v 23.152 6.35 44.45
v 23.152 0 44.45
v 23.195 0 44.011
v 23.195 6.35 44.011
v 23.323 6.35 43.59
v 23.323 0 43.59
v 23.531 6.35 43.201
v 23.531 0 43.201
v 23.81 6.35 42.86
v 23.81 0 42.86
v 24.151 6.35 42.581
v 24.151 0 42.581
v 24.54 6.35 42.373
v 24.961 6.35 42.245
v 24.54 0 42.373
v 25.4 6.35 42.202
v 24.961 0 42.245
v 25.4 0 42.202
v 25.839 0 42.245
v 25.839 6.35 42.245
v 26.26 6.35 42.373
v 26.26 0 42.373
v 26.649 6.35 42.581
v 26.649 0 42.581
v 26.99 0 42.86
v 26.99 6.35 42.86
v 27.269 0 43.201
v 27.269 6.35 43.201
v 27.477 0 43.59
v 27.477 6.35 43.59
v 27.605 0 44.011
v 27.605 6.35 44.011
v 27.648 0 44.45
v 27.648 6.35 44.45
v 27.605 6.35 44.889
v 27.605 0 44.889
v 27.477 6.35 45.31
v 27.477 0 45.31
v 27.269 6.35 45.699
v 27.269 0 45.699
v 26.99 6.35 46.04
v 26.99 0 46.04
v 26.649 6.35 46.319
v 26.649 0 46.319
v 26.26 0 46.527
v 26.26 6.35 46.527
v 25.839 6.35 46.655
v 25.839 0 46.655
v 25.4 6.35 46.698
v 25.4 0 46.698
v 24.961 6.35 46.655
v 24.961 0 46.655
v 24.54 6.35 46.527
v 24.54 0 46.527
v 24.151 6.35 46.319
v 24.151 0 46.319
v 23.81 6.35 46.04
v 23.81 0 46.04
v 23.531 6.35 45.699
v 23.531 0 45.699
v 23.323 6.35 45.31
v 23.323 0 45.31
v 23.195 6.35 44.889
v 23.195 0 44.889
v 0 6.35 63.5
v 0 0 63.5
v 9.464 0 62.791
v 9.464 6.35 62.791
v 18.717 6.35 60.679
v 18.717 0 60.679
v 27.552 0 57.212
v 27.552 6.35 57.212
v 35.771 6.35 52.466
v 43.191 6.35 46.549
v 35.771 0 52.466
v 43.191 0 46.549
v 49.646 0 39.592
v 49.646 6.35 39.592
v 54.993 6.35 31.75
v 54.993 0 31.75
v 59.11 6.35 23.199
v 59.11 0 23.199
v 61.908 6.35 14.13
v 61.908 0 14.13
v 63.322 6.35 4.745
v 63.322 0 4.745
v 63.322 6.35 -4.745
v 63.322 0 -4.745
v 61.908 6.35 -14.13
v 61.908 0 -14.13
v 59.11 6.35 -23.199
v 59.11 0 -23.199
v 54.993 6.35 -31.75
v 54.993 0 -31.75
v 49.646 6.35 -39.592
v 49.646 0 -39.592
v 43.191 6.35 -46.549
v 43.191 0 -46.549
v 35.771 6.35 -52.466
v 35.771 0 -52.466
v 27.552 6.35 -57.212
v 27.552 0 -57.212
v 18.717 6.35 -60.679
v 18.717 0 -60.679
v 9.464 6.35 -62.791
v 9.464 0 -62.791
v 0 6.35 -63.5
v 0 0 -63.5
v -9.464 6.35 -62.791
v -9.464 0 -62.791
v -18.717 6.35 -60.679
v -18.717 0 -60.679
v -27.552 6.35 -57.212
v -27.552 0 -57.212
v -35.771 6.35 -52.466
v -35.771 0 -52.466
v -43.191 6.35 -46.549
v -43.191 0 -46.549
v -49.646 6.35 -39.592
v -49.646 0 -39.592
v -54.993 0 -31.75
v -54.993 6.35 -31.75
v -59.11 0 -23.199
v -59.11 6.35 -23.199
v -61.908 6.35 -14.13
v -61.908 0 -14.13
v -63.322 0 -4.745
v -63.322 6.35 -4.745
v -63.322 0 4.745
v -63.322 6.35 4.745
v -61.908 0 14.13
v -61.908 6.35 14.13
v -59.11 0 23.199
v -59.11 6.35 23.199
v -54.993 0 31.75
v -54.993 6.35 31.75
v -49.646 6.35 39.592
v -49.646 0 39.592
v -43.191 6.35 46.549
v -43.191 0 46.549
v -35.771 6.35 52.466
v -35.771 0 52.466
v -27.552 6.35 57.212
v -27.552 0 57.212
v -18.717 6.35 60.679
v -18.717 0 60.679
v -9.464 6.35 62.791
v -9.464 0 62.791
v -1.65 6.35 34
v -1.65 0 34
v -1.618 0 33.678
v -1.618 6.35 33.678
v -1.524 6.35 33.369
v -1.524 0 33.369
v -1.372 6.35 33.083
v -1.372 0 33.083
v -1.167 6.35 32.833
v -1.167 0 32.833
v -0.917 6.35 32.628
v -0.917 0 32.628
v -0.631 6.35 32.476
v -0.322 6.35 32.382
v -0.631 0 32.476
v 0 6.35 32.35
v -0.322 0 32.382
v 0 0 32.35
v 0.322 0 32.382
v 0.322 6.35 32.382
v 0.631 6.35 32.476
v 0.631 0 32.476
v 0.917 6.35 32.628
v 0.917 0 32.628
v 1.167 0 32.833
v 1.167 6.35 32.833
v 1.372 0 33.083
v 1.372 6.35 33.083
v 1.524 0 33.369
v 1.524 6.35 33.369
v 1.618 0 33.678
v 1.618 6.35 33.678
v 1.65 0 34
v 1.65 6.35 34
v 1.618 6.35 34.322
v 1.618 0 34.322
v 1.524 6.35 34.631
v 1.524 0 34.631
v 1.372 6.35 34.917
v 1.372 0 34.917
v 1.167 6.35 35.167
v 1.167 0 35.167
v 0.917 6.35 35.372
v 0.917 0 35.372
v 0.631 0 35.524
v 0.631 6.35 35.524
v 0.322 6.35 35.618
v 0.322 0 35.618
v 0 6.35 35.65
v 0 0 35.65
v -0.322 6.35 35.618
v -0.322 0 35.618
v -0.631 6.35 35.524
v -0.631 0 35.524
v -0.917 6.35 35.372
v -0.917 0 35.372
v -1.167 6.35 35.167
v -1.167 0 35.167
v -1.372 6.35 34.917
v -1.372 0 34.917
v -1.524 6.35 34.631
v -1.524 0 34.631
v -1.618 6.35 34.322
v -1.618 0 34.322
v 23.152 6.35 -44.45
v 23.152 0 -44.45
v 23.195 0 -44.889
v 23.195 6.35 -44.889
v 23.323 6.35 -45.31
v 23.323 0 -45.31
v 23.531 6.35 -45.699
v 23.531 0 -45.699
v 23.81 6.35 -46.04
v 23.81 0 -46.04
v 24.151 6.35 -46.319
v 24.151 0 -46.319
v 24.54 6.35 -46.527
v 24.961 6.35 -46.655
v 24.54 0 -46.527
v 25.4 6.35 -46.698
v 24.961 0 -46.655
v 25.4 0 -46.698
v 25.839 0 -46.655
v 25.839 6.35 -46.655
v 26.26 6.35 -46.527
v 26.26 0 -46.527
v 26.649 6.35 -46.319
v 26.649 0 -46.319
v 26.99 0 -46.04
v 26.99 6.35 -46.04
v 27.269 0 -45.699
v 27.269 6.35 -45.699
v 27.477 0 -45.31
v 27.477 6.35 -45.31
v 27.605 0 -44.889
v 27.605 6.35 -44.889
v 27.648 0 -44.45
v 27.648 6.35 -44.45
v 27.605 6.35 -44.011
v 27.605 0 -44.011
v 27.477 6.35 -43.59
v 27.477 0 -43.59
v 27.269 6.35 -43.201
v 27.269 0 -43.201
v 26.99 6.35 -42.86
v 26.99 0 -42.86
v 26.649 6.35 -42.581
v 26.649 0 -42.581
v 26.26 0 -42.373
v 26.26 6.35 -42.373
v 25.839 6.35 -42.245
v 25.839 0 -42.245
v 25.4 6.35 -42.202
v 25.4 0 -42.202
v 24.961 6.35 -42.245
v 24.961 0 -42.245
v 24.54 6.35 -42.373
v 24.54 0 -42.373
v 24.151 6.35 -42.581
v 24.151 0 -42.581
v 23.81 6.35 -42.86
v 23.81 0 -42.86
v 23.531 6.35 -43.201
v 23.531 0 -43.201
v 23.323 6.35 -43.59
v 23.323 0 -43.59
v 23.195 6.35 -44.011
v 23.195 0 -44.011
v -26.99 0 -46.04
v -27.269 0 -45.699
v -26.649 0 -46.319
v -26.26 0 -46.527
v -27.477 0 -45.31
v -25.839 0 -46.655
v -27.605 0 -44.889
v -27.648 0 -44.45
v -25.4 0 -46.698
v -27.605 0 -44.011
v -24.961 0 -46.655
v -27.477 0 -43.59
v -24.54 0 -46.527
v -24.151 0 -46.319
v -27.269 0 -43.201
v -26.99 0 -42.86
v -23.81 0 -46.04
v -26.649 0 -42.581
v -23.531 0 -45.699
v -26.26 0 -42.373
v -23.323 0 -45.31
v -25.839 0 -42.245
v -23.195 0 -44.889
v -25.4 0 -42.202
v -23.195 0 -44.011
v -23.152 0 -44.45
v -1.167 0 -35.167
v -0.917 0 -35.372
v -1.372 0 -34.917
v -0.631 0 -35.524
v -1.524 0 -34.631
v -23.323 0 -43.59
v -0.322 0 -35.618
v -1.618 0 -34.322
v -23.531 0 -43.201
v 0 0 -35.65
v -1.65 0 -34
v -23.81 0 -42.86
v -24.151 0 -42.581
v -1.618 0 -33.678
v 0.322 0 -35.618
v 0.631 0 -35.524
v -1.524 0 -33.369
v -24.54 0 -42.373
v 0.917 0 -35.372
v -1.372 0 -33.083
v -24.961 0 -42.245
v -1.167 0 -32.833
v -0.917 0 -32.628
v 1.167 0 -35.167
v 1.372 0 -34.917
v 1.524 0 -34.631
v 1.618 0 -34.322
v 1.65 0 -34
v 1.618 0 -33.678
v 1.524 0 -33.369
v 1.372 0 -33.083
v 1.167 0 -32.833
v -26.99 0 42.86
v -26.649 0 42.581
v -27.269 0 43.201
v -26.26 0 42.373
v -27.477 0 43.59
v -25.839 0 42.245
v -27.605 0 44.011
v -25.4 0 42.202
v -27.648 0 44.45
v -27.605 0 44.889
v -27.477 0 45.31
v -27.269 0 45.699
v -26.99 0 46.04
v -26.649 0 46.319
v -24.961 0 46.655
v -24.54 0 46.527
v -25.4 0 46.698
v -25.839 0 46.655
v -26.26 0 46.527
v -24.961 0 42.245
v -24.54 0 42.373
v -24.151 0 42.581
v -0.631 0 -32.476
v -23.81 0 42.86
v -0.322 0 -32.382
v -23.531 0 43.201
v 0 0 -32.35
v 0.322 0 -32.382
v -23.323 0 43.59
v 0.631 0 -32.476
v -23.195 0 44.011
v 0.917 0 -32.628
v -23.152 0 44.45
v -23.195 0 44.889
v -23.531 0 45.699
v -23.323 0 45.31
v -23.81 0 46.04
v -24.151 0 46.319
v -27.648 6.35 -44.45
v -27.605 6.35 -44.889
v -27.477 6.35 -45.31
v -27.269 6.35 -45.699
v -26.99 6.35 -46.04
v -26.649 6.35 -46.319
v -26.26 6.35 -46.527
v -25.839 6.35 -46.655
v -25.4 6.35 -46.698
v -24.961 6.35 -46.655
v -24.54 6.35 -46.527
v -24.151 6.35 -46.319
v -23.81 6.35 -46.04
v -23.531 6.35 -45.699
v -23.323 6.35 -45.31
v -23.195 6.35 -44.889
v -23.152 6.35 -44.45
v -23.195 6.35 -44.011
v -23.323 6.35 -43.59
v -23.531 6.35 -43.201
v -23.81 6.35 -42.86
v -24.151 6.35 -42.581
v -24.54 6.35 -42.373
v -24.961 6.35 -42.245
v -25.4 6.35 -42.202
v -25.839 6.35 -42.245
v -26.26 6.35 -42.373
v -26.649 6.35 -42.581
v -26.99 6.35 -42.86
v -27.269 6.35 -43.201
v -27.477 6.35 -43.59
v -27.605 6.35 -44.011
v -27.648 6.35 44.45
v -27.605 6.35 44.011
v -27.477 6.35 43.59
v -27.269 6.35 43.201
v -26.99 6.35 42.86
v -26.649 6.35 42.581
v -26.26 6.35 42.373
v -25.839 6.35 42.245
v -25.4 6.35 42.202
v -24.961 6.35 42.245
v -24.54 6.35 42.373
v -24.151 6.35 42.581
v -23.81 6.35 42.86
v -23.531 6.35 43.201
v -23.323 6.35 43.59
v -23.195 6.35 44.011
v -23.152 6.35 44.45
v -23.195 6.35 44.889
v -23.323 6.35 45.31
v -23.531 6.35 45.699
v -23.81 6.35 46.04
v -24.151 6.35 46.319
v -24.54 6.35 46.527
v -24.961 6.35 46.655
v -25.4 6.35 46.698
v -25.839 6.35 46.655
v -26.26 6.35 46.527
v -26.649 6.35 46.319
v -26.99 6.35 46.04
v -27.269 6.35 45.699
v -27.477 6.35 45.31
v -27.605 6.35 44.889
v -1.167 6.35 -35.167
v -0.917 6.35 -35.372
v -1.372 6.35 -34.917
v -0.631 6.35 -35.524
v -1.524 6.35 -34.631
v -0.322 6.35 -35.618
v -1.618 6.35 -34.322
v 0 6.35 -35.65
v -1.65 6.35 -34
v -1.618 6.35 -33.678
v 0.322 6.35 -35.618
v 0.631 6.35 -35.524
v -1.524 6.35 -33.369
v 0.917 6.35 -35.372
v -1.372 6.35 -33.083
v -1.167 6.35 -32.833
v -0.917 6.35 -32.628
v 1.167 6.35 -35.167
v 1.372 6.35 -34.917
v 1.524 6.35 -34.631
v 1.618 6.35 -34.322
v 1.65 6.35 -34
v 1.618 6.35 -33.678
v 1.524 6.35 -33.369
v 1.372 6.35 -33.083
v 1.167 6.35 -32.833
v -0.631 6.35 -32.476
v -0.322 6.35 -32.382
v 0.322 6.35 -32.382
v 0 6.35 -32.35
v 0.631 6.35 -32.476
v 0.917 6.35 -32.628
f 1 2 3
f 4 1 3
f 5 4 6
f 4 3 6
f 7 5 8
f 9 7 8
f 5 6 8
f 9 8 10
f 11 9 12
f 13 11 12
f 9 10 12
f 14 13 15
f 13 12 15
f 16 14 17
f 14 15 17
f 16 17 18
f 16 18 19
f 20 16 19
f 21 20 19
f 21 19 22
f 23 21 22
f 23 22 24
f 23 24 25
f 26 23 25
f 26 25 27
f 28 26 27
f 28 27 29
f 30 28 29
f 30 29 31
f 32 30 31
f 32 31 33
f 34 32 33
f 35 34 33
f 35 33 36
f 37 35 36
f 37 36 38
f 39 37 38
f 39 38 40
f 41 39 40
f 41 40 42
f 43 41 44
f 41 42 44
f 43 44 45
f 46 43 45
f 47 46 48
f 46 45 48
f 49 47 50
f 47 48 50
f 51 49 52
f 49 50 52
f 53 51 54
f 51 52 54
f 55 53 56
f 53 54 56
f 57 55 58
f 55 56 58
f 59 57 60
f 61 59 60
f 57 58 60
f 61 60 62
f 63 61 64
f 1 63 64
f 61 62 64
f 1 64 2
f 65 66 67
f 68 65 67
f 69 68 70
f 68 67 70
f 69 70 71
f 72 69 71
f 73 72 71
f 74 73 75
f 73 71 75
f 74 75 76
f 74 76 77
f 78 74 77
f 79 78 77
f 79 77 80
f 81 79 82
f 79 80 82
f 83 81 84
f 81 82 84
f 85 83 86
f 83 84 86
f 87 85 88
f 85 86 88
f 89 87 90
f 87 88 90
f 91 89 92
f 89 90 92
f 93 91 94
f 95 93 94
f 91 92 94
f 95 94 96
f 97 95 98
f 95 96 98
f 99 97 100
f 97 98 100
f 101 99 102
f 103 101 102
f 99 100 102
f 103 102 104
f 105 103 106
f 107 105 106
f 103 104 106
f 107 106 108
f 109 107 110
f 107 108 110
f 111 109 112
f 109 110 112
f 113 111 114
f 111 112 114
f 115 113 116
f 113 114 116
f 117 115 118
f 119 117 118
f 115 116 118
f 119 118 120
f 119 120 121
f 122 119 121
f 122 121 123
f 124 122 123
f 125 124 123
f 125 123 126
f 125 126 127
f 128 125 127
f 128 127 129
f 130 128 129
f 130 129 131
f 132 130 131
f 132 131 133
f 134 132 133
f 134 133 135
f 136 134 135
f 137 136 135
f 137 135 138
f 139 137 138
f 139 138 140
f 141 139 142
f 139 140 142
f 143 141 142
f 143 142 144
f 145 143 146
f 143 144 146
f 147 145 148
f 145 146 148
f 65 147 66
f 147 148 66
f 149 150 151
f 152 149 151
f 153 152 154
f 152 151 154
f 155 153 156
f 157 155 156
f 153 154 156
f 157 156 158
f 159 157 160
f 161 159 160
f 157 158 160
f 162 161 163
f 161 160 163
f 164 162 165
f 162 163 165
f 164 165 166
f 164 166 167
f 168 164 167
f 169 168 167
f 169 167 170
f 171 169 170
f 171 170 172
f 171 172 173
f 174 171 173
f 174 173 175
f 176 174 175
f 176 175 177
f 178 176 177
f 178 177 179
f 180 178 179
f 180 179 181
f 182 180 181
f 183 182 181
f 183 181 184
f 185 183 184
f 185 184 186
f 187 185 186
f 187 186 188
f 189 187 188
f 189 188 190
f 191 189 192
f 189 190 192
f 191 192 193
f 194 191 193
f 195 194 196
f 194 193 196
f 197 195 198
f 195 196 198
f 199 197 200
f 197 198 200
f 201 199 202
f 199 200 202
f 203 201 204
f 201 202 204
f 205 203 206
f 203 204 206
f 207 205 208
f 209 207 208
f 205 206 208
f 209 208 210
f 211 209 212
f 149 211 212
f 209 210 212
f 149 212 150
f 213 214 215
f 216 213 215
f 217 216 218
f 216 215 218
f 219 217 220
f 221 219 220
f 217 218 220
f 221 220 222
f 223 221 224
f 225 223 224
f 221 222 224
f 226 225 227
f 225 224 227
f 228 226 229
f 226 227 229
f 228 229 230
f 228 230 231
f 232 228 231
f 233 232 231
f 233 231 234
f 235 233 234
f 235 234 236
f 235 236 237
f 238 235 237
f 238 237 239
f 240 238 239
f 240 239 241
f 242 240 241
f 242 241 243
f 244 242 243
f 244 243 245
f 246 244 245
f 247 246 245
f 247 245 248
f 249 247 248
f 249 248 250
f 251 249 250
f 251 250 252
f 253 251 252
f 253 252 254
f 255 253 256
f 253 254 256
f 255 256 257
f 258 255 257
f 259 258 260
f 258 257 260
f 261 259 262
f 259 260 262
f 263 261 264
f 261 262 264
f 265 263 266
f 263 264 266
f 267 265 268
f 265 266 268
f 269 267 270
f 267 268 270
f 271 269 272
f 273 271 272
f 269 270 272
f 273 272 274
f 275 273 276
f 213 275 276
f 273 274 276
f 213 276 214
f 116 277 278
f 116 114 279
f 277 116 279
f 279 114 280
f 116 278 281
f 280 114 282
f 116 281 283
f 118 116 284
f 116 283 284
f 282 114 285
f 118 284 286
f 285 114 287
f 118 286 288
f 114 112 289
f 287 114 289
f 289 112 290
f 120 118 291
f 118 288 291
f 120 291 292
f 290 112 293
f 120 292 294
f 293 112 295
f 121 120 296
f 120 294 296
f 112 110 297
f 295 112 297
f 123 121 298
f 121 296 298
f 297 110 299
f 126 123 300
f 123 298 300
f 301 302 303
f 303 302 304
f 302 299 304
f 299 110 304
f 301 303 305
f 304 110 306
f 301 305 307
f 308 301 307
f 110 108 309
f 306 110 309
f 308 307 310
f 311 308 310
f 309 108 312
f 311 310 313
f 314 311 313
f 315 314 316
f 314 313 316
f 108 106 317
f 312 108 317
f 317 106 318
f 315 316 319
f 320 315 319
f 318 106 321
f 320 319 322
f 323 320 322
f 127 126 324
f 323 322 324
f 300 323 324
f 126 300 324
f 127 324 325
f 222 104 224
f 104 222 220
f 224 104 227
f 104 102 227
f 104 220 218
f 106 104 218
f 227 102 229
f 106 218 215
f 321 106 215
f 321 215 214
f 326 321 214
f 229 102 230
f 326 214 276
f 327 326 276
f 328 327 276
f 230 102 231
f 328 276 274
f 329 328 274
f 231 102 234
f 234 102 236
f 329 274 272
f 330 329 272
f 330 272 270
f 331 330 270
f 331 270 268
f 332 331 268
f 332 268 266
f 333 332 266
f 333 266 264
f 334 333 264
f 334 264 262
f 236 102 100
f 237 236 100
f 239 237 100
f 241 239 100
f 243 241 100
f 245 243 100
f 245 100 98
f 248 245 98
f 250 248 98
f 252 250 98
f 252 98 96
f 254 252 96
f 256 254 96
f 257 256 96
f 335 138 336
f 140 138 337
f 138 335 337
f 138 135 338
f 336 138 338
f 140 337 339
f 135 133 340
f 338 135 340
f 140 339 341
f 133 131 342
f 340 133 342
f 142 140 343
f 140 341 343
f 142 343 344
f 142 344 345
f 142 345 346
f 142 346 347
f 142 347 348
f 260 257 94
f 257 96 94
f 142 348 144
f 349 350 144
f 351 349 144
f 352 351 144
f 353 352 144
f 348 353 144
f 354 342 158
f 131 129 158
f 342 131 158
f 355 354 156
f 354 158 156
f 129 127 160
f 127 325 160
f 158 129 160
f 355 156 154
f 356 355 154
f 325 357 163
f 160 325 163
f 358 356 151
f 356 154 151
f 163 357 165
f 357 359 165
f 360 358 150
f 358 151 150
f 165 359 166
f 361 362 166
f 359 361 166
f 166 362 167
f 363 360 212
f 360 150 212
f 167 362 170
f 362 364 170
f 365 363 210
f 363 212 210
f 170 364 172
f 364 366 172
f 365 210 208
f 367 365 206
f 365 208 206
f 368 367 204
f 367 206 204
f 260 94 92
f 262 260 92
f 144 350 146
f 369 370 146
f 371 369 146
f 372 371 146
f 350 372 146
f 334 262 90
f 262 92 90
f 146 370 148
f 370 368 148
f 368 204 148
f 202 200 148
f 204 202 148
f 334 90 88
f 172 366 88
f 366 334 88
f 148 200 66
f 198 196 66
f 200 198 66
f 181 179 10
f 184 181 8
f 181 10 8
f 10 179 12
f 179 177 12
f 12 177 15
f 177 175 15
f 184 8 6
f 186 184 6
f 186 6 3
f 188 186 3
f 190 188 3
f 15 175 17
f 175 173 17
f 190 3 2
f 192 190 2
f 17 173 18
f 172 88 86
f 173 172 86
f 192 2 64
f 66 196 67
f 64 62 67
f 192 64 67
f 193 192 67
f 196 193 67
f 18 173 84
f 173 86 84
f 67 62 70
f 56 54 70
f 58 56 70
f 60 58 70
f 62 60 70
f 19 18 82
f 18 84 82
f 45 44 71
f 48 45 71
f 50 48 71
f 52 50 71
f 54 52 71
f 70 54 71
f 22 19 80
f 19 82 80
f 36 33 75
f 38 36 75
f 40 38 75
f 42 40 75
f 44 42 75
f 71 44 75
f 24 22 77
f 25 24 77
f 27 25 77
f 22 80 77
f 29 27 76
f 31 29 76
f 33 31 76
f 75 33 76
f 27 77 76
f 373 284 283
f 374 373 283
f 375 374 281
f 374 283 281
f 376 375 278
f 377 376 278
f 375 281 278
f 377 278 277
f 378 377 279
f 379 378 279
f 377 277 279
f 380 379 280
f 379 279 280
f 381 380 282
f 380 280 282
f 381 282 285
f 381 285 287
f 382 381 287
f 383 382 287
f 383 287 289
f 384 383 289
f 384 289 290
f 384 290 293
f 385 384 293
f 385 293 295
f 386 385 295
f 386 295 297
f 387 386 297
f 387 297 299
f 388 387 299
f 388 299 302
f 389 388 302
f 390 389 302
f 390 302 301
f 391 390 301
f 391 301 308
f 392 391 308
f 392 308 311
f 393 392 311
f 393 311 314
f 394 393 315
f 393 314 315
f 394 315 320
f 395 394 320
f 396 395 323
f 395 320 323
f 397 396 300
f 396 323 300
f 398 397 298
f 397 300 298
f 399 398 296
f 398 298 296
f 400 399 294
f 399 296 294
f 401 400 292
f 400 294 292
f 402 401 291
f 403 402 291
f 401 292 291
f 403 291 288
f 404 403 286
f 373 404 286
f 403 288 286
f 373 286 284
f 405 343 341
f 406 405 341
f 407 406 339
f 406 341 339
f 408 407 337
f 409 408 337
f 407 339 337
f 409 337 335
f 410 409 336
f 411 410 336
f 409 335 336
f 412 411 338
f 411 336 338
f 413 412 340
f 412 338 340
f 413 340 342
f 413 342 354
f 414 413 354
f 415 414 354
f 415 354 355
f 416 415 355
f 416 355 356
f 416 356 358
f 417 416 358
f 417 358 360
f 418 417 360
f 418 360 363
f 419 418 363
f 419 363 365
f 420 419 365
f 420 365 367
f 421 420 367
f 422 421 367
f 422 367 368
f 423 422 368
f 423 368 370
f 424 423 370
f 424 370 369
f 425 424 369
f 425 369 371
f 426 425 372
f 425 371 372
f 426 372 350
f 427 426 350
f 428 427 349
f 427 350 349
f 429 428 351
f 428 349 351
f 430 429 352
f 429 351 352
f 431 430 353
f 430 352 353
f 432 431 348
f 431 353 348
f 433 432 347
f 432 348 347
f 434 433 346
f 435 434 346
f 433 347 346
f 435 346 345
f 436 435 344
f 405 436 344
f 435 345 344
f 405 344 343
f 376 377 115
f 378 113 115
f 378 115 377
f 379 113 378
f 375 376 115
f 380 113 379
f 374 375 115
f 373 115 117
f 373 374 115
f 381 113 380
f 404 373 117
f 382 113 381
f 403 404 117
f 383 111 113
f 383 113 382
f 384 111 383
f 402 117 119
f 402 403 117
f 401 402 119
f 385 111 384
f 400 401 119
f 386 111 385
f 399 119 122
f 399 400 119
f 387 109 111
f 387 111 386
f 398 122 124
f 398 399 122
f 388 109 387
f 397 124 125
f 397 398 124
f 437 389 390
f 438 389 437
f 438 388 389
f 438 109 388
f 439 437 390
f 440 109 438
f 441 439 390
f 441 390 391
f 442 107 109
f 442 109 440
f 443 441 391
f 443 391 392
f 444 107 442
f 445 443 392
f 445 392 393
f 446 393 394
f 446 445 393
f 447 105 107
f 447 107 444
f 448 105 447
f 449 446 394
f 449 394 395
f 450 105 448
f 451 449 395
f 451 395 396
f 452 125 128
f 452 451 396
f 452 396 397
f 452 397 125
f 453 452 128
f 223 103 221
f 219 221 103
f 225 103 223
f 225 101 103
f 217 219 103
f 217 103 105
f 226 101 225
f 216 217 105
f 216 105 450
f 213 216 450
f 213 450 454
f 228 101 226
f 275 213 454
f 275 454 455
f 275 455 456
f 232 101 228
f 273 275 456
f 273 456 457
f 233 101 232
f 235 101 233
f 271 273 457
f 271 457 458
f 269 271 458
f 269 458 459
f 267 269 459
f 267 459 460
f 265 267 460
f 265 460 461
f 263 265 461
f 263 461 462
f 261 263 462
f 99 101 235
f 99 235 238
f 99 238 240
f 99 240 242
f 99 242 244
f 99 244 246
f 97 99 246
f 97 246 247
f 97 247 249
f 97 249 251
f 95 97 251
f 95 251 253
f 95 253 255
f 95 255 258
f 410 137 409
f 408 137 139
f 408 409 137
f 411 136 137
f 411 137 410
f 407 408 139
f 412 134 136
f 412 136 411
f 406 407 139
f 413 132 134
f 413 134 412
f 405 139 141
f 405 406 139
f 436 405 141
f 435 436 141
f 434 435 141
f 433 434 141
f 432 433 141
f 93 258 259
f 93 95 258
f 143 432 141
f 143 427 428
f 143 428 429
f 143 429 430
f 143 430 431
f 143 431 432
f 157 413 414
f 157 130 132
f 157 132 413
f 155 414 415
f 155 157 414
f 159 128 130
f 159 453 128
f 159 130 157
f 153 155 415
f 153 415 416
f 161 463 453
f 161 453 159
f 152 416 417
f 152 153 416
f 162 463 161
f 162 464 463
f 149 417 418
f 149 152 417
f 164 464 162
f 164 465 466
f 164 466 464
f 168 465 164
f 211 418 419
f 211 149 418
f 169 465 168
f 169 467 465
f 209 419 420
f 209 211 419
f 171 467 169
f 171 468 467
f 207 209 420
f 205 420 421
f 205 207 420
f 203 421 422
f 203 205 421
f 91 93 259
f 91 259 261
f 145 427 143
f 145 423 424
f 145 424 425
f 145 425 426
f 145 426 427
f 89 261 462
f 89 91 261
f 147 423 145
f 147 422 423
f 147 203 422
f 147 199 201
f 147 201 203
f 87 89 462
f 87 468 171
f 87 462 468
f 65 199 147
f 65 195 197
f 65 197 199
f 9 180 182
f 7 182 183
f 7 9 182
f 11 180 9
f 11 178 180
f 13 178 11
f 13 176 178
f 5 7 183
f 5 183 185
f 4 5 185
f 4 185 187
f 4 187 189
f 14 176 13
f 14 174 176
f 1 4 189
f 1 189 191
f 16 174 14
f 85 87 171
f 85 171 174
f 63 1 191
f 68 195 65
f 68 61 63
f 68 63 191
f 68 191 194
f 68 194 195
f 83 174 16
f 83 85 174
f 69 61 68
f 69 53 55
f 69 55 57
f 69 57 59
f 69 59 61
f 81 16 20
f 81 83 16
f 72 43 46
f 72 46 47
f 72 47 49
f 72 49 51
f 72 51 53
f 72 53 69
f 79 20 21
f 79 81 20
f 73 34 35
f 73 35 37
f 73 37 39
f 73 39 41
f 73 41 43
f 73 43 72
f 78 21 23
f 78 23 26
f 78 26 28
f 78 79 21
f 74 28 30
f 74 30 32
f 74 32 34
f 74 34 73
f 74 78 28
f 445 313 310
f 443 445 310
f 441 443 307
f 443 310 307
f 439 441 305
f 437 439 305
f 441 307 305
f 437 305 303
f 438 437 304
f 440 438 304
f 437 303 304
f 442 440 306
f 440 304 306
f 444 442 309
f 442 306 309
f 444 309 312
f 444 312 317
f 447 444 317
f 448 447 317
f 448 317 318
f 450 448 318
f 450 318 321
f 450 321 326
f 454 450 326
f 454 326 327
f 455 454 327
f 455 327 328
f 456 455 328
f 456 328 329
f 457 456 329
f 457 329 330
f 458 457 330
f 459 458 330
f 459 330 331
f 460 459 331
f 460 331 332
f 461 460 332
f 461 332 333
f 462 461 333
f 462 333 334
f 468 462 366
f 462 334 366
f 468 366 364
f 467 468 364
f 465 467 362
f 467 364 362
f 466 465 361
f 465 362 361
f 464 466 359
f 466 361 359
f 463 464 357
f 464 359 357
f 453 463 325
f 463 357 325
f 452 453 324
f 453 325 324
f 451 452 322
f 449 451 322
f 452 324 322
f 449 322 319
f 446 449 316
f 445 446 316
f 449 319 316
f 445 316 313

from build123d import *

# Parameters (mm, degrees)
SKETCH1_R                   = 63.5
BOSS_EXTRUDE1_DEPTH         = 6.35
F_8_CLEARANCE_HOLE1_D       = 4.4958
TAP_DRILL_FOR_M4X0_7_TAP1_D = 3.3


with BuildPart() as part:
    # Sketch1 → Boss-Extrude1 (new body)
    with BuildSketch(Plane(origin=(0, 0, 0), x_dir=(1, 0, 0), z_dir=(0, 1, 0))):
        with Locations(Location((0, 0, 0), (0, 0, 270))):
            Circle(SKETCH1_R)
    extrude(amount=BOSS_EXTRUDE1_DEPTH)

    # #8 Clearance Hole1 (through all)
    with Locations(Plane(origin=(0, 6.35, 0), x_dir=(1, 0, 0), z_dir=(0, 1, 0))):
        with Locations((-25.4, -44.45), (25.4, -44.45), (25.4, 44.45), (-25.4, 44.45)):
            Hole(F_8_CLEARANCE_HOLE1_D / 2)

    # Tap Drill for M4x0.7 Tap1 (through all)
    with Locations(Plane(origin=(0, 6.35, 0), x_dir=(1, 0, 0), z_dir=(0, 1, 0))):
        with Locations((0, 34), (0, -34)):
            Hole(TAP_DRILL_FOR_M4X0_7_TAP1_D / 2)


solid = part.part
